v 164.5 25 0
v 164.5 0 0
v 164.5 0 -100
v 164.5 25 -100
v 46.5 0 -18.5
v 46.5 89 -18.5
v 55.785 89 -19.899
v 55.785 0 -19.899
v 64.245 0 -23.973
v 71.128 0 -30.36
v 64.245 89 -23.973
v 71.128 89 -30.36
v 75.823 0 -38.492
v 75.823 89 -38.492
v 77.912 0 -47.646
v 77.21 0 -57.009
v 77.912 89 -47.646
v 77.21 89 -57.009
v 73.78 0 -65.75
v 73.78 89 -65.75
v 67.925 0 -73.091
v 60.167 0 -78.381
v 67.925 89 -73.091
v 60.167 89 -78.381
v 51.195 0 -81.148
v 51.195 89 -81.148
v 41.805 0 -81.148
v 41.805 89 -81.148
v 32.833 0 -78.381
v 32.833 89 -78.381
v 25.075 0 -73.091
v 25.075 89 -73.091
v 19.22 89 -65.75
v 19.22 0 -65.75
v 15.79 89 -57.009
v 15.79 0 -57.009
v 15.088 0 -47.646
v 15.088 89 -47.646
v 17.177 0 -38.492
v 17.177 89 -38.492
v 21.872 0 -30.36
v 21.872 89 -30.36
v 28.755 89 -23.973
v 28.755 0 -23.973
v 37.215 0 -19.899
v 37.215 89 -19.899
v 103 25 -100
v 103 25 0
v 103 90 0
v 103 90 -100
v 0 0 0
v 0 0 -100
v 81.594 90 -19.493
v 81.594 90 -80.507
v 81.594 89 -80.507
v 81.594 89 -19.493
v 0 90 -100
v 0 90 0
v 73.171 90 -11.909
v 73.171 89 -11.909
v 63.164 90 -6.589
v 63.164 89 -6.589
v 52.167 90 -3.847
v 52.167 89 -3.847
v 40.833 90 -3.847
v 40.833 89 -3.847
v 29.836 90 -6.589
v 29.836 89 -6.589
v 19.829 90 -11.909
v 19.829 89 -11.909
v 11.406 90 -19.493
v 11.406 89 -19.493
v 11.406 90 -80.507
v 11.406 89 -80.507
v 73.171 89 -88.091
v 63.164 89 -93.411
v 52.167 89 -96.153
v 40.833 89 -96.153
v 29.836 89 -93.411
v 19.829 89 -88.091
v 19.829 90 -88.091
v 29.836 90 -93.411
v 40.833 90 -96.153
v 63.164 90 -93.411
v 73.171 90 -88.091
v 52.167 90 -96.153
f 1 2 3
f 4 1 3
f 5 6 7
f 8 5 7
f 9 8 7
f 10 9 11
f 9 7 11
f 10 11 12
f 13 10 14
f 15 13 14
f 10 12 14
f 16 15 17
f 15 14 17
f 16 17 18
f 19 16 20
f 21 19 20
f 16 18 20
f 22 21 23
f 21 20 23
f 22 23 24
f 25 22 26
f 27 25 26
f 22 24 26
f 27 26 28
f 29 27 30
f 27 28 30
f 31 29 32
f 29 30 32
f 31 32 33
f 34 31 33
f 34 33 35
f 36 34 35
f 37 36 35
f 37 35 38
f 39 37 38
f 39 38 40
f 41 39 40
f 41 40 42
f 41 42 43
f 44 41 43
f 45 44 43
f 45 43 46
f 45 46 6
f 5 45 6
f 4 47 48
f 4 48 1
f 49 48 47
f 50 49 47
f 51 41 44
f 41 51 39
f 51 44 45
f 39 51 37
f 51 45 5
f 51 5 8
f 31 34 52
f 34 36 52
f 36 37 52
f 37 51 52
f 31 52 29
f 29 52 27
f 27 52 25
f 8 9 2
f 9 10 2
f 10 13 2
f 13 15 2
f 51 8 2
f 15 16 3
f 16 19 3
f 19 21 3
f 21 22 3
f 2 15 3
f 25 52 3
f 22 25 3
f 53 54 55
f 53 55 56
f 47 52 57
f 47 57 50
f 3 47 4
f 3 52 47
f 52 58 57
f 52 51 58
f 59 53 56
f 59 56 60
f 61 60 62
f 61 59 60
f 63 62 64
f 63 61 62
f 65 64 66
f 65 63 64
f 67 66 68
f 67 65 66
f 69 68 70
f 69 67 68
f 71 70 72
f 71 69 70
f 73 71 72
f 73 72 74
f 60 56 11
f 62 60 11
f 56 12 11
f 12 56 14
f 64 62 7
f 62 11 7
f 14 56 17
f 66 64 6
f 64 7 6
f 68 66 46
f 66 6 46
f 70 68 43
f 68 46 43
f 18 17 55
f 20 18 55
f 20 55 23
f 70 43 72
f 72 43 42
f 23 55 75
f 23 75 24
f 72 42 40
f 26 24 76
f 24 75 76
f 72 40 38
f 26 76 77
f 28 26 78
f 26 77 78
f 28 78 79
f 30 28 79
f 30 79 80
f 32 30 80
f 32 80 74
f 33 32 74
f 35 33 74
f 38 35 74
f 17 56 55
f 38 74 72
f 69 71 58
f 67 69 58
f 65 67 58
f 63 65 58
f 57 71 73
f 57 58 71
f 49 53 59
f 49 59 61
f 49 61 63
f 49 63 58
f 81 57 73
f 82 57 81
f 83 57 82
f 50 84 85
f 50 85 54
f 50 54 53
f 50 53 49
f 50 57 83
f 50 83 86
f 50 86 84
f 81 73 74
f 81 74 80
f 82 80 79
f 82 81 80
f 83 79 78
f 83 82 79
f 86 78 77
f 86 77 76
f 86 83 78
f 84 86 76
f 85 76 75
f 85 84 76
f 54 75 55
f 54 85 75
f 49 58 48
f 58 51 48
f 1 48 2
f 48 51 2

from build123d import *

# Parameters (mm, degrees)
SKETCH_1_W          = 164.5
SKETCH_1_H          = 100
EXTRUDE_1_DEPTH     = 25
SKETCH_2_W          = 103
SKETCH_2_H          = 100
EXTRUDE_2_DEPTH     = 65
CUT_EXTRUDE_3_DEPTH = 125
CUT_EXTRUDE_4_DEPTH = 1


with BuildPart() as part:
    # 草图1 → 凸台-拉伸1 (new body)
    with BuildSketch(Plane(origin=(0, 0, 0), x_dir=(1, 0, 0), z_dir=(0, 1, 0))):
        with Locations((82.25, 50)):
            Rectangle(SKETCH_1_W, SKETCH_1_H)
    extrude(amount=EXTRUDE_1_DEPTH)

    # 草图2 → 凸台-拉伸2 (add)
    with BuildSketch(Plane(origin=(0, 25, 0), x_dir=(1, 0, 0), z_dir=(0, 1, 0))):
        with Locations((51.5, 50)):
            Rectangle(SKETCH_2_W, SKETCH_2_H)
    extrude(amount=EXTRUDE_2_DEPTH)

    # 草图5 → 切除-拉伸3 (cut)
    with BuildSketch(Plane(origin=(0, 90, 0), x_dir=(1, 0, 0), z_dir=(0, 1, 0))):
        with BuildLine():
            ThreePointArc((78, 50), (46.5, 81.5), (15, 50))
            ThreePointArc((15, 50), (46.5, 18.5), (78, 50))
        make_face()
    extrude(amount=-CUT_EXTRUDE_3_DEPTH, mode=Mode.SUBTRACT)

    # 草图6 → 切除-拉伸4 (cut)
    with BuildSketch(Plane(origin=(0, 90, 0), x_dir=(1, 0, 0), z_dir=(0, 1, 0))):
        with BuildLine():
            Line((81.59399548, 19.493255152), (81.59399548, 80.506744848))
            ThreePointArc((81.59399548, 80.506744848), (46.5, 96.5), (11.40600452, 80.506744848))
            Line((11.40600452, 80.506744848), (11.40600452, 19.493255152))
            ThreePointArc((11.40600452, 19.493255152), (46.5, 3.5), (81.59399548, 19.493255152))
        make_face()
        with BuildLine():
            ThreePointArc((78, 50), (16.994826039, 38.96846749), (70.273351777, 70.665859413))
            ThreePointArc((70.273351777, 70.665859413), (76.005173961, 61.03153251), (78, 50))
        make_face(mode=Mode.SUBTRACT)
    extrude(amount=-CUT_EXTRUDE_4_DEPTH, mode=Mode.SUBTRACT)


solid = part.part
